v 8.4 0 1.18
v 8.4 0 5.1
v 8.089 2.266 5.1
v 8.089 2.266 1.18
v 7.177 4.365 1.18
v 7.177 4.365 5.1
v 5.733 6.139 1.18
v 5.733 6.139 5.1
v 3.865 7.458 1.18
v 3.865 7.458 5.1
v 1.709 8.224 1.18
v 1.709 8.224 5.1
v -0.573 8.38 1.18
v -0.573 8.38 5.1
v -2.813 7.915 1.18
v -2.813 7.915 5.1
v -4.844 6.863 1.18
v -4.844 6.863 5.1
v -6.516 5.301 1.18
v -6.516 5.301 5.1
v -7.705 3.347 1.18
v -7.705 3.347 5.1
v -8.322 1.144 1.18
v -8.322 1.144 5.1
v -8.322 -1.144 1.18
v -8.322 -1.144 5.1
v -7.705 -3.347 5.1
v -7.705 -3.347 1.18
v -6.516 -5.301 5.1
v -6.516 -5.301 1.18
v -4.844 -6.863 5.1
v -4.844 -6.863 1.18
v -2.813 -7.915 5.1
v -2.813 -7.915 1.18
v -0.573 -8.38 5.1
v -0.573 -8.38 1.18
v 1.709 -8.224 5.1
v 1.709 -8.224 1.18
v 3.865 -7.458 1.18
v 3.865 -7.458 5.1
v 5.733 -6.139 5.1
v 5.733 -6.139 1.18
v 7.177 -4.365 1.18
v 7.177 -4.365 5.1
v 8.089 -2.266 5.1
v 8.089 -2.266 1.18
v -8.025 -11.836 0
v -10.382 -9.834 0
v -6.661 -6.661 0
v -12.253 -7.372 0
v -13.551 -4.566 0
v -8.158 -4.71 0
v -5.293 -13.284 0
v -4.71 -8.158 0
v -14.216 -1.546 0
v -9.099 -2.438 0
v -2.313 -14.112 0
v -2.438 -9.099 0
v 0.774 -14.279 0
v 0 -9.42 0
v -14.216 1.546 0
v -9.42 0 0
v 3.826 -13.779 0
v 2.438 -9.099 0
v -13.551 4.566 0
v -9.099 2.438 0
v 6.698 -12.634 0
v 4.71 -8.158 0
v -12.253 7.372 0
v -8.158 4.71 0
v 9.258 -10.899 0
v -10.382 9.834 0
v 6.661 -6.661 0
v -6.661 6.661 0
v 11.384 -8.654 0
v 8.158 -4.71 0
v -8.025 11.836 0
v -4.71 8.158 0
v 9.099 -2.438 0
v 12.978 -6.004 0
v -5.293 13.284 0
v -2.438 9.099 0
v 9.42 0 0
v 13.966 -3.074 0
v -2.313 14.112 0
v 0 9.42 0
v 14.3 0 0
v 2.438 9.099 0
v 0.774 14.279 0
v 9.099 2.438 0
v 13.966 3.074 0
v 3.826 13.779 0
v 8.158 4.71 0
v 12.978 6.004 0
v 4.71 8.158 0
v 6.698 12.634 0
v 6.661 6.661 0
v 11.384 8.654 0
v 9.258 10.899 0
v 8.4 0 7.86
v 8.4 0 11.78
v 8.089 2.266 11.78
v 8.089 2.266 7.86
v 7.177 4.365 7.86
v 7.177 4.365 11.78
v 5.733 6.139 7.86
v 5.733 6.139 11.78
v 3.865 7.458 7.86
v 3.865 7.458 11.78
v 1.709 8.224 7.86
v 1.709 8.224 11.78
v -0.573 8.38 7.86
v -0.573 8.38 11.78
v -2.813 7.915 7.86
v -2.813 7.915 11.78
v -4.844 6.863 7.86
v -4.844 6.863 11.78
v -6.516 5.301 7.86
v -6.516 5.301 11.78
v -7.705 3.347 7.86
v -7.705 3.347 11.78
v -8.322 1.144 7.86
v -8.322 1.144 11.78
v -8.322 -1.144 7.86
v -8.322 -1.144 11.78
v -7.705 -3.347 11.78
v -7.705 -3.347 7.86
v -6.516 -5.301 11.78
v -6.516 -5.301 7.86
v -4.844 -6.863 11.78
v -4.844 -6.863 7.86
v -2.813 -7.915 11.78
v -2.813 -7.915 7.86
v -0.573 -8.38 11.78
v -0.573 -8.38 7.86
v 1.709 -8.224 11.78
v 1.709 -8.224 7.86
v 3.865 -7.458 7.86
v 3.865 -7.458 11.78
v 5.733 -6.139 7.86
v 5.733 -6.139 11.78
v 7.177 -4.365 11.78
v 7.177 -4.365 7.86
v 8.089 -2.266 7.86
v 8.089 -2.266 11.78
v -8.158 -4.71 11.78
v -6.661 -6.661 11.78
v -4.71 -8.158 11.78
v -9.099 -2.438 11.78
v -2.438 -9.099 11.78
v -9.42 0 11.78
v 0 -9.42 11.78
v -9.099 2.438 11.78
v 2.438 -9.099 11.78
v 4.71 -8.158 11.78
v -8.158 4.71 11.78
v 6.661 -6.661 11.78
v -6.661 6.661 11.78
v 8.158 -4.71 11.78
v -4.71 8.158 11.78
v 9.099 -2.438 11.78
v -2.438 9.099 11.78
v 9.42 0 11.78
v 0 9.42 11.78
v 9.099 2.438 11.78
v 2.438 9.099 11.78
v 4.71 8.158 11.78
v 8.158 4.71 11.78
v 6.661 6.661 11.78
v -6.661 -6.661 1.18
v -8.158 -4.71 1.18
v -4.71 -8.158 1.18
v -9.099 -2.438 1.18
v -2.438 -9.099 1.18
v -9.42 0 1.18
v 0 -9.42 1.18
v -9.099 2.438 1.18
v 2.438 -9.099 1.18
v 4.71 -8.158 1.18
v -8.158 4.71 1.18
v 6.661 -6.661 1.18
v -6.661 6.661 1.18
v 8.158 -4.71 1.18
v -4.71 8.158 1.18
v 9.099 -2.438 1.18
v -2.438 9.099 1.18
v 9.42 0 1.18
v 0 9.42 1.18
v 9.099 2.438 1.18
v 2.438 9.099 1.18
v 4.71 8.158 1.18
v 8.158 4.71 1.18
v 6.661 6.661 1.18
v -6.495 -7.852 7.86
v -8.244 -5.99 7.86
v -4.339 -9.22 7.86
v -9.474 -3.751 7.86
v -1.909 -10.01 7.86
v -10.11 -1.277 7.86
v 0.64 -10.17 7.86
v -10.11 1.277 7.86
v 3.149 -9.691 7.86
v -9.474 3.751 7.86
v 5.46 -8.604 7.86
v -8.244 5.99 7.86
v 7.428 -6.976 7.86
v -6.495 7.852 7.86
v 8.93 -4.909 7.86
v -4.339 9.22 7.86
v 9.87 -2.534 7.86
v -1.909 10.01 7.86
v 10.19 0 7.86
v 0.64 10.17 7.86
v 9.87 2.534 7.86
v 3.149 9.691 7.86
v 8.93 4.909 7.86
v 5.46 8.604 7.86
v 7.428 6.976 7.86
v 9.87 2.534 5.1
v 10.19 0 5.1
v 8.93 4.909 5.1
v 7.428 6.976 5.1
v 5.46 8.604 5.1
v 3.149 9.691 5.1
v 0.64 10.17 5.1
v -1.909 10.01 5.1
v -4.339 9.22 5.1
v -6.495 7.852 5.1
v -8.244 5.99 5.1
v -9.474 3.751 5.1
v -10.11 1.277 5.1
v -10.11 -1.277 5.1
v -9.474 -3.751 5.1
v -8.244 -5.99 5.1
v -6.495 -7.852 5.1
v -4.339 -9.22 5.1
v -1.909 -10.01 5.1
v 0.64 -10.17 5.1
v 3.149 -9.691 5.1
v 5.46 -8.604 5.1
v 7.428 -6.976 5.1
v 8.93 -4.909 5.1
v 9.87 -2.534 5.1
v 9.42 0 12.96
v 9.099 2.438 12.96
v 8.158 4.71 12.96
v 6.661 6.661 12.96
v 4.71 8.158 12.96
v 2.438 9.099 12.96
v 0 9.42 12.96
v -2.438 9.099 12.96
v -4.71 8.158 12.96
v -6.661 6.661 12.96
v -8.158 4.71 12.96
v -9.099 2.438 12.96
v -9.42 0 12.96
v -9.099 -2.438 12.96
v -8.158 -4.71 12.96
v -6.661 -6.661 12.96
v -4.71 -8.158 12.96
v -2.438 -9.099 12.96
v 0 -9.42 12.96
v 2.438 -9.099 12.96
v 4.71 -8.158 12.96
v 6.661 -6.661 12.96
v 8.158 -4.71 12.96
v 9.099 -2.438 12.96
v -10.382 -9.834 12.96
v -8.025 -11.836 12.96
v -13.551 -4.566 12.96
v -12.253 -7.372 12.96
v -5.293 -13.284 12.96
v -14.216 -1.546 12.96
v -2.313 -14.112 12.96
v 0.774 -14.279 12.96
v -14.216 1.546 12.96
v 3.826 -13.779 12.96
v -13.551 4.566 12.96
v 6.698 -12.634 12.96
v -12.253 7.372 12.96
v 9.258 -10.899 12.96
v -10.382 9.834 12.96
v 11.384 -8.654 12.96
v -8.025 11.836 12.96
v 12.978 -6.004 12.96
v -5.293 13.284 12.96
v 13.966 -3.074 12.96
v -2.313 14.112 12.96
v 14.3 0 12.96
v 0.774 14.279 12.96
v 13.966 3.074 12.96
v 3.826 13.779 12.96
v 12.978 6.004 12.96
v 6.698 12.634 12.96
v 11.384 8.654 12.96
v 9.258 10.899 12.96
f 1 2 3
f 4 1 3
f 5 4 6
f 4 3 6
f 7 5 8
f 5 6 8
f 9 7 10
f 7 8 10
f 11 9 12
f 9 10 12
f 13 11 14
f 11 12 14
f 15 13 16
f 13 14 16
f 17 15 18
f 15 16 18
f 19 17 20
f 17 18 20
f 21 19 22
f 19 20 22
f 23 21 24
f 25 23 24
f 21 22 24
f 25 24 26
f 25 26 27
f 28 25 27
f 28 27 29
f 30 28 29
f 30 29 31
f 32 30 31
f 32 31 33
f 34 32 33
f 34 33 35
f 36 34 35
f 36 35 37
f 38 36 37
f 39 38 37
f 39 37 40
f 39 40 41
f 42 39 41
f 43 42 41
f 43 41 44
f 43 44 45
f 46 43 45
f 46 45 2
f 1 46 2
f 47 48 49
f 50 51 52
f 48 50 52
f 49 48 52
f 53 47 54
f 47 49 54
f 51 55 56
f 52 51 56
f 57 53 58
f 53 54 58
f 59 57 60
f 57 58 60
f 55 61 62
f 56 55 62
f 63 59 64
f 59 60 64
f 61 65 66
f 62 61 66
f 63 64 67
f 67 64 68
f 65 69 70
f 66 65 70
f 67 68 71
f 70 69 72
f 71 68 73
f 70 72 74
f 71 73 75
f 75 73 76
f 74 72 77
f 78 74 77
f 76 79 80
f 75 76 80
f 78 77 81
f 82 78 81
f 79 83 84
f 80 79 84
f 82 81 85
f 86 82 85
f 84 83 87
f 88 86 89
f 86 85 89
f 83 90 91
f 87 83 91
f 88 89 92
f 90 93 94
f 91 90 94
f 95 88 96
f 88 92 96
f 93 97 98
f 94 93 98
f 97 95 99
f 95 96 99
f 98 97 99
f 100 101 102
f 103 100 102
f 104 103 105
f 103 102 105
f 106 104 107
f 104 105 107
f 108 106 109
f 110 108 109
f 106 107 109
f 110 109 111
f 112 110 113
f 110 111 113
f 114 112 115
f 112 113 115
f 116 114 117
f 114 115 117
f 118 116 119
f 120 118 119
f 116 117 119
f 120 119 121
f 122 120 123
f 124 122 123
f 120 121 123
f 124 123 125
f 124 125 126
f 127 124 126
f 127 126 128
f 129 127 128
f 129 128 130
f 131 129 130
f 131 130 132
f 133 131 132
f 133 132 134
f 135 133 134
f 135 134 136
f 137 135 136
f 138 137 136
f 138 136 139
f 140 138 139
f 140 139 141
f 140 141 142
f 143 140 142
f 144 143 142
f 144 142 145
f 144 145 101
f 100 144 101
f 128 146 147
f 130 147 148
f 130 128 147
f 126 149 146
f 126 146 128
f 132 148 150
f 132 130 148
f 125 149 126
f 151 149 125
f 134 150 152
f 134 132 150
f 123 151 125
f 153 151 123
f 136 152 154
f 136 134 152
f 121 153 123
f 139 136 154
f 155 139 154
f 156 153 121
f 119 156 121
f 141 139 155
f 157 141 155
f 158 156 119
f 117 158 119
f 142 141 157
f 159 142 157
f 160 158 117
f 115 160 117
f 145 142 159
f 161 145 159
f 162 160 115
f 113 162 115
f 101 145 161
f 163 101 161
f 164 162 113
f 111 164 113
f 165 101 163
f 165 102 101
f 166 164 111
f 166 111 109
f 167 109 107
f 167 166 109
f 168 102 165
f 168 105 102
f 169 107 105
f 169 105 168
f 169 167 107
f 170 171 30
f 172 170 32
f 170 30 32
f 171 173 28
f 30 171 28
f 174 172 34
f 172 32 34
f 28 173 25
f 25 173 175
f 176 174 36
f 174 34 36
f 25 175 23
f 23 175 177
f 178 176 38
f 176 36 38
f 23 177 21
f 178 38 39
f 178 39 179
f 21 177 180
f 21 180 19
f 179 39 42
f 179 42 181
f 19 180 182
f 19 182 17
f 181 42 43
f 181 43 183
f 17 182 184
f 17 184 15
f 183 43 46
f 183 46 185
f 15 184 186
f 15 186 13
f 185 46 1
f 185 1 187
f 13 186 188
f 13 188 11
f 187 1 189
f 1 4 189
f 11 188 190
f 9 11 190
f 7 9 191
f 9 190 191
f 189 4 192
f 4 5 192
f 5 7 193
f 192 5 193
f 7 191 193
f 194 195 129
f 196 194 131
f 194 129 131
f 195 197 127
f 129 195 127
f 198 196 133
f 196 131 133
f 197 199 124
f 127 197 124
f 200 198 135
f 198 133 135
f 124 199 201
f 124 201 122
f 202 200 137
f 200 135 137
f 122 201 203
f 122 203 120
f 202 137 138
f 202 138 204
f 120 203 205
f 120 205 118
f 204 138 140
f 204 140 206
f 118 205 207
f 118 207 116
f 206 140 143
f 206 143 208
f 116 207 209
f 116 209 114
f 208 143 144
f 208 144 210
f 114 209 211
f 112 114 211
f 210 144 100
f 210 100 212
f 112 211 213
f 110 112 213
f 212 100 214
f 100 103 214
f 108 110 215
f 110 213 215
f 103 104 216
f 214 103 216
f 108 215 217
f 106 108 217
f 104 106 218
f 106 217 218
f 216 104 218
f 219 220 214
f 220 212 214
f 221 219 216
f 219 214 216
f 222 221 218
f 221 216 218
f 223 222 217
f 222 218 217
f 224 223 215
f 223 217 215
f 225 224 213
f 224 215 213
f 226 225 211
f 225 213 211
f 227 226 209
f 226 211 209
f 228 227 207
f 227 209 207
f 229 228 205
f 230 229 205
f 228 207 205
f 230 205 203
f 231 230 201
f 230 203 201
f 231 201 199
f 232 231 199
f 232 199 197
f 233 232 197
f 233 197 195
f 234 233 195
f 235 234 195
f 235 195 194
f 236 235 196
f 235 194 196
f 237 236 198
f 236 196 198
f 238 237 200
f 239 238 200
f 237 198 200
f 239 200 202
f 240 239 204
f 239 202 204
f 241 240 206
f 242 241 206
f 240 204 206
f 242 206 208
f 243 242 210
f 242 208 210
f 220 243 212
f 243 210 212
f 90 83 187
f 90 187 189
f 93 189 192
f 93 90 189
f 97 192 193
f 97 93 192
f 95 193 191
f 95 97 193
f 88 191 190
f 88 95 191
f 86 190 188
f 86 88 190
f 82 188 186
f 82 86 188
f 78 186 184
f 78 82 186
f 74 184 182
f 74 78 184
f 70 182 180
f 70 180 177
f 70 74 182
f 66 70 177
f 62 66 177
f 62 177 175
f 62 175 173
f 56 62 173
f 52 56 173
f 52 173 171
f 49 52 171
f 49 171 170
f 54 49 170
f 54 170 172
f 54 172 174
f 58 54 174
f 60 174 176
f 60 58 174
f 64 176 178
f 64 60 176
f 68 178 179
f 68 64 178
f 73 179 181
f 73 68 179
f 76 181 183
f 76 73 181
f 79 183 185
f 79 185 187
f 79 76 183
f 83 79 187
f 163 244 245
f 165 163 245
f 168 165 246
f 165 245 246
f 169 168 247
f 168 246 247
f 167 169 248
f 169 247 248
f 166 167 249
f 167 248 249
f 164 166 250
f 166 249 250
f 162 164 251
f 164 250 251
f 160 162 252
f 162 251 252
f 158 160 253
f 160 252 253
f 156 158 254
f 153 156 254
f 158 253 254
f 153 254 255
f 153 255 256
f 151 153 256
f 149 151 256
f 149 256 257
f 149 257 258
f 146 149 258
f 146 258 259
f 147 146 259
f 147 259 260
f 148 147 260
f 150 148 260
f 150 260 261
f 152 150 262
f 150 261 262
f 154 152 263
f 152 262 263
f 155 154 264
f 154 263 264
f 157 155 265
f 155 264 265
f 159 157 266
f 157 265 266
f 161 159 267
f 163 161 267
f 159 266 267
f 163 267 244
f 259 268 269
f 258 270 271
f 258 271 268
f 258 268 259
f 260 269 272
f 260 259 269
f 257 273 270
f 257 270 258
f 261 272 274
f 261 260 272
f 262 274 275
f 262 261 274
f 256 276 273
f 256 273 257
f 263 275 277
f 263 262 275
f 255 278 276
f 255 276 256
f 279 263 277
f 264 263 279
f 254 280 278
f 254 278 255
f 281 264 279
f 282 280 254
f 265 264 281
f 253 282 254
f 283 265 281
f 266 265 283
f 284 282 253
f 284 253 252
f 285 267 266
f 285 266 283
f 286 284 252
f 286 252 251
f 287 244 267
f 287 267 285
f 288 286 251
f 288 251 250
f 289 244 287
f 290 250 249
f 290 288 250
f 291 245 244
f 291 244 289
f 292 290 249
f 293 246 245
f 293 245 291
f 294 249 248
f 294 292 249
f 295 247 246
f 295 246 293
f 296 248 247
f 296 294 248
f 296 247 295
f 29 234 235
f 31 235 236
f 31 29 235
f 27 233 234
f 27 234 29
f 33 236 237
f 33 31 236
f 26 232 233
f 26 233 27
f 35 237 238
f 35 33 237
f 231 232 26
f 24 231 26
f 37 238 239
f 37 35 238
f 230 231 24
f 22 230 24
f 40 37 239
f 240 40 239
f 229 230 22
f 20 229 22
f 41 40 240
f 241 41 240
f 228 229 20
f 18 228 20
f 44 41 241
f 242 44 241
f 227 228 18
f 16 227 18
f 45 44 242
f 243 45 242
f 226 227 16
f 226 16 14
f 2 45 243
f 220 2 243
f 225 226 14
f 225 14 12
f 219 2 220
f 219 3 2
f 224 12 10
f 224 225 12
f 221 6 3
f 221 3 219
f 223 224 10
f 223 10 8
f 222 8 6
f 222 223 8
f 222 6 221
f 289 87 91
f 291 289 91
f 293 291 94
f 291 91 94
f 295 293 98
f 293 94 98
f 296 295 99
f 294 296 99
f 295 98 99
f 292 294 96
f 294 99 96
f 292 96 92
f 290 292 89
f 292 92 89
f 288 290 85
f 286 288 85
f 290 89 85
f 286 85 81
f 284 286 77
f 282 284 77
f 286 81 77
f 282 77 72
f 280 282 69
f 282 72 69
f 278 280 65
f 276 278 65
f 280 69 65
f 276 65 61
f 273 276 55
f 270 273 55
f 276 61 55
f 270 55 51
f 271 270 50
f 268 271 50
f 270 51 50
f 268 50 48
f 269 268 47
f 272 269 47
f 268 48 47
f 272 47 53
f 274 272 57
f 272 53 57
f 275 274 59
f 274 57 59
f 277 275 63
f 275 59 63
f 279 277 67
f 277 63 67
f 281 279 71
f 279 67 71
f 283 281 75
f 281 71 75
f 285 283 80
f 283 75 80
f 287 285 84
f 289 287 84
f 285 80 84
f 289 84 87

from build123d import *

# Parameters (mm, degrees)
SZKIC1_R                    = 14.3
DODANIE_WYCI_GNI_CIE1_DEPTH = 12.96
WYTNIJ_WYCI_GNI_CIE1_REACH  = 14.96
SZKIC2_R                    = 8.4
SZKIC3_R                    = 9.42
WYTNIJ_WYCI_GNI_CIE2_DEPTH  = 1.18
SZKIC5_R                    = 10.19
WYTNIJ_WYCI_GNI_CIE3_DEPTH  = 1.38


with BuildPart() as part:
    # Szkic1 → Dodanie-wyciągnięcie1 (new body)
    with BuildSketch(Plane.XY):
        Circle(SZKIC1_R)
    extrude(amount=DODANIE_WYCI_GNI_CIE1_DEPTH)

    # Szkic2 → Wytnij-wyciągnięcie1 (cut, up to next)
    with BuildSketch(Plane.XY.offset(12.96), mode=Mode.PRIVATE) as wytnij_wyci_gni_cie1_sk1:
        Circle(SZKIC2_R)
    wytnij_wyci_gni_cie1_tool1 = extrude(wytnij_wyci_gni_cie1_sk1.sketch, amount=-WYTNIJ_WYCI_GNI_CIE1_REACH, mode=Mode.PRIVATE) & part.part
    add(wytnij_wyci_gni_cie1_tool1.solids().sort_by_distance((0, 0, 12.96))[0], mode=Mode.SUBTRACT)

    # Szkic3 → Wytnij-wyciągnięcie2 (cut)
    with BuildSketch(Plane.XY.offset(12.96)):
        Circle(SZKIC3_R)
    wytnij_wyci_gni_cie2 = extrude(amount=-WYTNIJ_WYCI_GNI_CIE2_DEPTH, mode=Mode.SUBTRACT)

    # Lustro1: Wytnij-wyciągnięcie2 across plane
    add(wytnij_wyci_gni_cie2.mirror(Plane.XY.offset(6.48)), mode=Mode.SUBTRACT)

    # Szkic5 → Wytnij-wyciągnięcie3 (cut, symmetric)
    with BuildSketch(Plane.XY.offset(6.48)):
        Circle(SZKIC5_R)
    extrude(amount=WYTNIJ_WYCI_GNI_CIE3_DEPTH, both=True, mode=Mode.SUBTRACT)


solid = part.part
